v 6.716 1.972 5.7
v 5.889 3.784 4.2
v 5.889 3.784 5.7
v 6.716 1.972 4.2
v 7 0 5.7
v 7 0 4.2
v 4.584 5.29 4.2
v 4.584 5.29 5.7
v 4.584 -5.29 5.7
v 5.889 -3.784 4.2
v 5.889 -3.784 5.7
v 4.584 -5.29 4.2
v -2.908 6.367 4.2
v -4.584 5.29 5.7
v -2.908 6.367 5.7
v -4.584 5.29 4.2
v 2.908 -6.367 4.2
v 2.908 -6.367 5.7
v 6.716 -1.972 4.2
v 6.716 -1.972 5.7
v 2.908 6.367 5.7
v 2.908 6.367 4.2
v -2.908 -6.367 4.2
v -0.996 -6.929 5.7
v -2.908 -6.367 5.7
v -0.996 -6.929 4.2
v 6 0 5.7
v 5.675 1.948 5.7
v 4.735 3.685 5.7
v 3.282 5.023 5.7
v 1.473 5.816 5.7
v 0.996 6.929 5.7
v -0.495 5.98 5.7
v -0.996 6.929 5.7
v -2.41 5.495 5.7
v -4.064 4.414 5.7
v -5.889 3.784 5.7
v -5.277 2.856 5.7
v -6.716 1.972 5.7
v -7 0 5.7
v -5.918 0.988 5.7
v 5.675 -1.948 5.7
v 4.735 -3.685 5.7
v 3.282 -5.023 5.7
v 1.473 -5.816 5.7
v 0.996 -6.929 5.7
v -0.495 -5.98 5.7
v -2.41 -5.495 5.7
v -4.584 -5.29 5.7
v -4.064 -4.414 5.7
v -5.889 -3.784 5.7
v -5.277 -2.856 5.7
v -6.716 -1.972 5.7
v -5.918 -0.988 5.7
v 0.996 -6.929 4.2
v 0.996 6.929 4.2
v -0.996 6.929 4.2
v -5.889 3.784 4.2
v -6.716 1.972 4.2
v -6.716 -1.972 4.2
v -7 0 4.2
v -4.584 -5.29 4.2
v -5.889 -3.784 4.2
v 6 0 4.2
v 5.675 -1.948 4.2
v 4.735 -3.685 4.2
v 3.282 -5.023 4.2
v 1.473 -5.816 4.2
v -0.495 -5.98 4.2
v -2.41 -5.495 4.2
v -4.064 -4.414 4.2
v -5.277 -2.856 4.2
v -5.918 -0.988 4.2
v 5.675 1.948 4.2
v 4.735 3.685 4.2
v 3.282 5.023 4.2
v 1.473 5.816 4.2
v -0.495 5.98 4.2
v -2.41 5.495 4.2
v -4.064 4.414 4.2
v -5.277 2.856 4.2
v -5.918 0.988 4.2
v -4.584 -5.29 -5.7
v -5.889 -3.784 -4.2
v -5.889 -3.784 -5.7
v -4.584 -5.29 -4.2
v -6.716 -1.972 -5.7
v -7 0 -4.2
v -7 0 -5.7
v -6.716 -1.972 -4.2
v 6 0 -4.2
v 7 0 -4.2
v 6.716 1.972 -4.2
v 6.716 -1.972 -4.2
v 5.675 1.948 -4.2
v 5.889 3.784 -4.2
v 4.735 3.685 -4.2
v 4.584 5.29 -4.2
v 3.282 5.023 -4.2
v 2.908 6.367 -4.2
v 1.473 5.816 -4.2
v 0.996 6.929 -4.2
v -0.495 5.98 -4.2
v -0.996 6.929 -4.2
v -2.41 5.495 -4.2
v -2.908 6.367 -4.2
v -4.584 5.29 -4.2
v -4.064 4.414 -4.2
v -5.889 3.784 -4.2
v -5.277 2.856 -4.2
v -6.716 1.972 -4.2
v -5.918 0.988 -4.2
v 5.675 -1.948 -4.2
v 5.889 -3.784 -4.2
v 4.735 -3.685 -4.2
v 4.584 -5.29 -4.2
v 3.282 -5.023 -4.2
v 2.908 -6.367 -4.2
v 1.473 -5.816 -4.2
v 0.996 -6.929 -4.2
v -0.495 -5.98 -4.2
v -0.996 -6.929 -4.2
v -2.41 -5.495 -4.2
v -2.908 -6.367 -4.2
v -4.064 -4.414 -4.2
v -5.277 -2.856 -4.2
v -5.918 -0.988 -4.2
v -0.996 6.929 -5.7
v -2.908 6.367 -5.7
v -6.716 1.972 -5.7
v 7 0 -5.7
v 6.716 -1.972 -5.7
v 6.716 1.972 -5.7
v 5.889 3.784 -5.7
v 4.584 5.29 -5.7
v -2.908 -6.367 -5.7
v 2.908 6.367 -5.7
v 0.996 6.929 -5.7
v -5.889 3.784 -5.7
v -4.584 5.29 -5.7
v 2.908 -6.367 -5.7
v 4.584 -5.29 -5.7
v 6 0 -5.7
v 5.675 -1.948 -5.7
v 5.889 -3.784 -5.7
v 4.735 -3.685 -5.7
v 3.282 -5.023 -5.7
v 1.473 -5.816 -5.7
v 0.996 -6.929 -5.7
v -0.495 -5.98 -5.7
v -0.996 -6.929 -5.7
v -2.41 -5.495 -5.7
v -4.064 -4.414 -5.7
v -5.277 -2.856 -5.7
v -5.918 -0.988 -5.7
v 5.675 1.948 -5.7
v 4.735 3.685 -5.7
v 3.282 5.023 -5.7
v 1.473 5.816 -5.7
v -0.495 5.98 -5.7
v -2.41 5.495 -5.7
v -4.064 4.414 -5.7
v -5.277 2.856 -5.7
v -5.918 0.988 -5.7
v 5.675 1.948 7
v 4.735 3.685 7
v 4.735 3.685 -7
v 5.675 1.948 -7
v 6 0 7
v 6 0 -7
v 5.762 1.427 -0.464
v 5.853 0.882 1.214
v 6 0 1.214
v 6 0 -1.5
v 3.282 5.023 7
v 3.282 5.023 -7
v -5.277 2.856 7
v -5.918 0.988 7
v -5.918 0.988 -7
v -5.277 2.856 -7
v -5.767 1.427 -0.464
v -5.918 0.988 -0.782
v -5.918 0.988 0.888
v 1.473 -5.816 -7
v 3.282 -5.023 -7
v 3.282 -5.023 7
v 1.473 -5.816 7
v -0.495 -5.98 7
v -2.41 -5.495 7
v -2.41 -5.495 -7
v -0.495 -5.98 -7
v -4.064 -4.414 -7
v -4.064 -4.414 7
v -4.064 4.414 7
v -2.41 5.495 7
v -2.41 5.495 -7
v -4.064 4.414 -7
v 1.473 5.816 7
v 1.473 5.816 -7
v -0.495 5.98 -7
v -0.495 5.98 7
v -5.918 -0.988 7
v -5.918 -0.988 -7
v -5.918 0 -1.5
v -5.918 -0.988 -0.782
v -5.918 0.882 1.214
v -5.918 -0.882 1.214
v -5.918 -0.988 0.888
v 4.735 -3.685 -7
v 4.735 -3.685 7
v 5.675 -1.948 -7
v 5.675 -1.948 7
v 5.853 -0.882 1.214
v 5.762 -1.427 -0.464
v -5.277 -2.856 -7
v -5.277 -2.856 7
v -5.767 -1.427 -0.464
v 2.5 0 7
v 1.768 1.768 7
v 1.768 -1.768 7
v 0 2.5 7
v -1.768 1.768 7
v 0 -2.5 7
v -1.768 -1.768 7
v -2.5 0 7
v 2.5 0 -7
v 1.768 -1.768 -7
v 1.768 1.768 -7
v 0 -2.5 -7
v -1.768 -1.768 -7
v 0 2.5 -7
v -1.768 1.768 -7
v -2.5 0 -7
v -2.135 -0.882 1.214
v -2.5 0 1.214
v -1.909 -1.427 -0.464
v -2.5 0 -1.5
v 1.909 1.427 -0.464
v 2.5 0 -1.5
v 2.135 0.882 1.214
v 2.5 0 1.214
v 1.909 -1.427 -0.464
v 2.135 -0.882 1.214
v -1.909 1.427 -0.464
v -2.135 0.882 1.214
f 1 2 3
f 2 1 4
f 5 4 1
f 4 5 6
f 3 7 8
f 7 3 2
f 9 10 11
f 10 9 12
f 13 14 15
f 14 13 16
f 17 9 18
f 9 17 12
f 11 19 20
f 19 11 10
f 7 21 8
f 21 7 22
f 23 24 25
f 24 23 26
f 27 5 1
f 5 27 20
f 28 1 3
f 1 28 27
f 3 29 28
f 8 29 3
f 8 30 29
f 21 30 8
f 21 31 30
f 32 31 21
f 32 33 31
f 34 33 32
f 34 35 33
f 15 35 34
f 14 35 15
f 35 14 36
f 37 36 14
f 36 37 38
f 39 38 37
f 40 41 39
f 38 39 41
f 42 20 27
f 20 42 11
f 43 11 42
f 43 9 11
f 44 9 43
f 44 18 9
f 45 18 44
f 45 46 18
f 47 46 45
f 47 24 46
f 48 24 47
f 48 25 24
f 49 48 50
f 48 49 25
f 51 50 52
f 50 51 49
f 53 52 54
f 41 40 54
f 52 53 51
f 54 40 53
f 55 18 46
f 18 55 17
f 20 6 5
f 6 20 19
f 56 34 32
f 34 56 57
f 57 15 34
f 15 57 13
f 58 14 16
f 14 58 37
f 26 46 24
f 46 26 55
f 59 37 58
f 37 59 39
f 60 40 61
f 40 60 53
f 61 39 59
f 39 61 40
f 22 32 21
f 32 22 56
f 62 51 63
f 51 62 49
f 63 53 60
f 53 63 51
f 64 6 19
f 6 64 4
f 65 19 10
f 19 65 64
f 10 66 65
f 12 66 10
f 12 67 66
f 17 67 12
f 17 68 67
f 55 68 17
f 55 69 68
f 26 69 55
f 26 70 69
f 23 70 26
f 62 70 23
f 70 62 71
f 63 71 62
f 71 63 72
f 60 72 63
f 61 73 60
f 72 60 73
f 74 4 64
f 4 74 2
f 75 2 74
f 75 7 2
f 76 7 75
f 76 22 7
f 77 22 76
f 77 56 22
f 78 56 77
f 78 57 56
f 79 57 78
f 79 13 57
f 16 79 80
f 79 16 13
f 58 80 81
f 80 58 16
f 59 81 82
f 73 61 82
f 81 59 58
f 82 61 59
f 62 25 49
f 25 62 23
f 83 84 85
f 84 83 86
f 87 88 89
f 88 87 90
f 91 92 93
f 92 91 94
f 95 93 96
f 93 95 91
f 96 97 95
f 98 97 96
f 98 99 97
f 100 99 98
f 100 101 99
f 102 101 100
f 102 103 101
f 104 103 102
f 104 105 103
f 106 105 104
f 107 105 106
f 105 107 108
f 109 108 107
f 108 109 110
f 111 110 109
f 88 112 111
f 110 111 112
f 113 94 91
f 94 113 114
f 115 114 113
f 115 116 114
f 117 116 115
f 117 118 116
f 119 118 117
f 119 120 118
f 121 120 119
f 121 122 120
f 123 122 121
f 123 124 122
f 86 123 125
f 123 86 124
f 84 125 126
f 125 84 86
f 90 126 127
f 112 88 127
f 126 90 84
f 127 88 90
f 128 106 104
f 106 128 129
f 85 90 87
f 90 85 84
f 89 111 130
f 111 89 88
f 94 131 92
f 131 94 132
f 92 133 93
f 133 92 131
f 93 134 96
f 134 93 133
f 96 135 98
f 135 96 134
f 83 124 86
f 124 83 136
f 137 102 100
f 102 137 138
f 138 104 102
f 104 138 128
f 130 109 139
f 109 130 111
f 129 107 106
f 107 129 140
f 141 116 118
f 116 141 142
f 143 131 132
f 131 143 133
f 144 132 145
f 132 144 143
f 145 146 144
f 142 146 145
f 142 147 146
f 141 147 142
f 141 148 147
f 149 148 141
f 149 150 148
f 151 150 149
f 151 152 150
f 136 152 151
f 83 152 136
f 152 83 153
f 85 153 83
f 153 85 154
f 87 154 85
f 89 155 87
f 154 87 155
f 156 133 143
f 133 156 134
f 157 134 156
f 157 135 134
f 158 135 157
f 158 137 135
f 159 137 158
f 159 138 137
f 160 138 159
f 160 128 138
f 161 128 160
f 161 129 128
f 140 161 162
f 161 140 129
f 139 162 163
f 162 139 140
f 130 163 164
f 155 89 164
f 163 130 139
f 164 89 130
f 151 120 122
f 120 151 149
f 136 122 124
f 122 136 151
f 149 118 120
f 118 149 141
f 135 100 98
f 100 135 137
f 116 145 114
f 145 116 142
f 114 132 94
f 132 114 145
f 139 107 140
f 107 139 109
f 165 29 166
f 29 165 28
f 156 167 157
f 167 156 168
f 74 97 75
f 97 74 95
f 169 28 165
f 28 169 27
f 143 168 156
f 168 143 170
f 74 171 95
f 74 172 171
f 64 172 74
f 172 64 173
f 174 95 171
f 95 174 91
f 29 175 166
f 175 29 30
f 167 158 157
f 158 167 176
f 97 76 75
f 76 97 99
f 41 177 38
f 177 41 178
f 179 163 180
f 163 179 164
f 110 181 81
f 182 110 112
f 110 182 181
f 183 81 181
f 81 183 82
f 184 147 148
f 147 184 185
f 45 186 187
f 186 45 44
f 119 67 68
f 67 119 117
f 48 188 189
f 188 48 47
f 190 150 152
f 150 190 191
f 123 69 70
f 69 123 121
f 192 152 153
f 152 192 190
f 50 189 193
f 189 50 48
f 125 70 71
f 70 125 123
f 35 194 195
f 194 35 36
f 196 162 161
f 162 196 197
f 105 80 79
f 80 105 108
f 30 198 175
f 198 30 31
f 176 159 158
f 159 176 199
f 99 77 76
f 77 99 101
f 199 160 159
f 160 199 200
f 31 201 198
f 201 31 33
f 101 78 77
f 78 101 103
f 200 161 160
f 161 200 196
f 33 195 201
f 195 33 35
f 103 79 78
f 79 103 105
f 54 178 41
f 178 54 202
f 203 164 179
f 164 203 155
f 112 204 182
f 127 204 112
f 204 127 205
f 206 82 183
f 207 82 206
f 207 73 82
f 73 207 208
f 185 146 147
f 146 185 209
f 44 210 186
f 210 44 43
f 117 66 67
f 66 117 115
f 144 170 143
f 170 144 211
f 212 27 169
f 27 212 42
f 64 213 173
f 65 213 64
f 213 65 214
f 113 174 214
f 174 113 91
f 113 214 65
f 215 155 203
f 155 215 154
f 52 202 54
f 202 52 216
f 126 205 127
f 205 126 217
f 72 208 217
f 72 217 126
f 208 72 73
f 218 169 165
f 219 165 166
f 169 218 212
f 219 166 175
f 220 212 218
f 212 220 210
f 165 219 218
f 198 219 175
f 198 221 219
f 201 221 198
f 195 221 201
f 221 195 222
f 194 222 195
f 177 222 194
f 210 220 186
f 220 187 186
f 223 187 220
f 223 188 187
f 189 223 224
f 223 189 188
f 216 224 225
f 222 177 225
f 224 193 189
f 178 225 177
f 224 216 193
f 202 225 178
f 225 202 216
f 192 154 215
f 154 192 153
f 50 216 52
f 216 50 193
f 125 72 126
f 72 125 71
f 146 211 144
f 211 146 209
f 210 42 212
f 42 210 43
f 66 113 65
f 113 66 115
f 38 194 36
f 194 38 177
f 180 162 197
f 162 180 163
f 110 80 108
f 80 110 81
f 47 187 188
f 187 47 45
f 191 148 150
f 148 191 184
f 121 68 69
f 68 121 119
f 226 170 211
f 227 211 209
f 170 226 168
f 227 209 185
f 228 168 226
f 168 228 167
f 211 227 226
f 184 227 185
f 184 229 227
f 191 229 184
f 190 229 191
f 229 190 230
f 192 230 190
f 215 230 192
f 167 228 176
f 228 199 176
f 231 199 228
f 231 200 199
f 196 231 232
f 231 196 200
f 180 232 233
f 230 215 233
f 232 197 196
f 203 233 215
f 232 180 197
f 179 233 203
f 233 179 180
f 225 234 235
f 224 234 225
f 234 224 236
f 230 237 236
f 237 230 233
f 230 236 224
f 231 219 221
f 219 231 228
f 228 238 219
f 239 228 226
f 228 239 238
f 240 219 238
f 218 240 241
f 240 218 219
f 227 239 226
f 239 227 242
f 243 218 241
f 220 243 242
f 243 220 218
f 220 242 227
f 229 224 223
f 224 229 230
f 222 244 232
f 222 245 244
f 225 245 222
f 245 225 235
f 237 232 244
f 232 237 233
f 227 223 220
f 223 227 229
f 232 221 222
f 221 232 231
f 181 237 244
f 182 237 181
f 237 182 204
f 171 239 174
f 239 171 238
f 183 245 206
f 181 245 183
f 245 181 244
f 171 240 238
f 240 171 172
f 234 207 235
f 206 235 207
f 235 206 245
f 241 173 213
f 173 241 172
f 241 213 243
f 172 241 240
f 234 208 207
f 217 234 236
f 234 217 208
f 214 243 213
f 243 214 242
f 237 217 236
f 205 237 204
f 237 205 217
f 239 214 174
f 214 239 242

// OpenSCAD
// Parameters
tooth_count = 16; //[8:64:1]
pitch_diameter_mm = 9.75; //[5:20:0.05]
pitch_radius_mm = 4.875; //[2.5:10:0.05]
belt_pitch_mm = 2; //[1:5:0.01]
pulley_width_mm = 10; //[5:30:0.5]
bore_diameter_mm = 5; //[2:10:0.1]
hub_diameter_mm = 12; //[6:24:0.5]
hub_length_mm = 14; //[6:30:0.5]
flange_diameter_mm = 14; //[8:30:0.5]
flange_thickness_mm = 1.5; //[0:4:0.1]
set_screw_count = 1; //[0:2:1]
set_screw_diameter_mm = 3; //[1.5:6:0.1]
set_screw_z_offset_mm = 0; //[-10:10:0.5]
tooth_radial_height_mm = 0.8; //[0.3:2:0.05]
tooth_root_depth_mm = 0.4; //[0.1:1.5:0.05]
tooth_tangential_width_factor = 0.55; //[0.3:0.9:0.01]
overlap_mm = 0.8; //[0.5:2:0.1]

// Pulley - complete geometry
module pulley() {
  color("Silver") {
    // Toothed pulley body
    cylinder(r=pitch_radius_mm + tooth_radial_height_mm, h=pulley_width_mm, center=true);
    
    // Hub
    cylinder(r=hub_diameter_mm/2, h=hub_length_mm, center=true);
    
    // Flanges
    if (flange_thickness_mm > 0) {
      translate([0, 0, pulley_width_mm/2 + flange_thickness_mm/2 - overlap_mm])
        cylinder(r=flange_diameter_mm/2, h=flange_thickness_mm, center=true);
      translate([0, 0, -pulley_width_mm/2 - flange_thickness_mm/2 + overlap_mm])
        cylinder(r=flange_diameter_mm/2, h=flange_thickness_mm, center=true);
    }
  }
}

// Printed Pulley GT2 Teeth - complete geometry
module printed_pulley_GT2_teeth() {
  color("DimGray") {
    for (i = [0:tooth_count-1]) {
      rotate([0, 0, i*360/tooth_count]) {
        translate([pitch_radius_mm + (tooth_radial_height_mm + tooth_root_depth_mm)/2 - overlap_mm, 0, 0])
          cube([tooth_radial_height_mm + tooth_root_depth_mm, belt_pitch_mm * tooth_tangential_width_factor, pulley_width_mm], center=true);
      }
    }
  }
}

// Printed Pulley Teeth From Profile - complete geometry
module printed_pulley_teeth_from_profile() {
  printed_pulley_GT2_teeth();
}

// Printed Pulley Teeth - complete geometry
module printed_pulley_teeth() {
  printed_pulley_teeth_from_profile();
}

// Assembly
module assembly() {
  difference() {
    union() {
      pulley();
      printed_pulley_teeth();
    }
    // Center bore
    cylinder(r=bore_diameter_mm/2, h=hub_length_mm + 2*overlap_mm, center=true);
    
    // Set screw holes
    if (set_screw_count > 0) {
      for (i = [0:set_screw_count-1]) {
        rotate([0, 90, i*90]) {
          translate([0, 0, set_screw_z_offset_mm])
            cylinder(r=set_screw_diameter_mm/2, h=hub_diameter_mm + 2*overlap_mm, center=true);
        }
      }
    }
  }
}

assembly();
